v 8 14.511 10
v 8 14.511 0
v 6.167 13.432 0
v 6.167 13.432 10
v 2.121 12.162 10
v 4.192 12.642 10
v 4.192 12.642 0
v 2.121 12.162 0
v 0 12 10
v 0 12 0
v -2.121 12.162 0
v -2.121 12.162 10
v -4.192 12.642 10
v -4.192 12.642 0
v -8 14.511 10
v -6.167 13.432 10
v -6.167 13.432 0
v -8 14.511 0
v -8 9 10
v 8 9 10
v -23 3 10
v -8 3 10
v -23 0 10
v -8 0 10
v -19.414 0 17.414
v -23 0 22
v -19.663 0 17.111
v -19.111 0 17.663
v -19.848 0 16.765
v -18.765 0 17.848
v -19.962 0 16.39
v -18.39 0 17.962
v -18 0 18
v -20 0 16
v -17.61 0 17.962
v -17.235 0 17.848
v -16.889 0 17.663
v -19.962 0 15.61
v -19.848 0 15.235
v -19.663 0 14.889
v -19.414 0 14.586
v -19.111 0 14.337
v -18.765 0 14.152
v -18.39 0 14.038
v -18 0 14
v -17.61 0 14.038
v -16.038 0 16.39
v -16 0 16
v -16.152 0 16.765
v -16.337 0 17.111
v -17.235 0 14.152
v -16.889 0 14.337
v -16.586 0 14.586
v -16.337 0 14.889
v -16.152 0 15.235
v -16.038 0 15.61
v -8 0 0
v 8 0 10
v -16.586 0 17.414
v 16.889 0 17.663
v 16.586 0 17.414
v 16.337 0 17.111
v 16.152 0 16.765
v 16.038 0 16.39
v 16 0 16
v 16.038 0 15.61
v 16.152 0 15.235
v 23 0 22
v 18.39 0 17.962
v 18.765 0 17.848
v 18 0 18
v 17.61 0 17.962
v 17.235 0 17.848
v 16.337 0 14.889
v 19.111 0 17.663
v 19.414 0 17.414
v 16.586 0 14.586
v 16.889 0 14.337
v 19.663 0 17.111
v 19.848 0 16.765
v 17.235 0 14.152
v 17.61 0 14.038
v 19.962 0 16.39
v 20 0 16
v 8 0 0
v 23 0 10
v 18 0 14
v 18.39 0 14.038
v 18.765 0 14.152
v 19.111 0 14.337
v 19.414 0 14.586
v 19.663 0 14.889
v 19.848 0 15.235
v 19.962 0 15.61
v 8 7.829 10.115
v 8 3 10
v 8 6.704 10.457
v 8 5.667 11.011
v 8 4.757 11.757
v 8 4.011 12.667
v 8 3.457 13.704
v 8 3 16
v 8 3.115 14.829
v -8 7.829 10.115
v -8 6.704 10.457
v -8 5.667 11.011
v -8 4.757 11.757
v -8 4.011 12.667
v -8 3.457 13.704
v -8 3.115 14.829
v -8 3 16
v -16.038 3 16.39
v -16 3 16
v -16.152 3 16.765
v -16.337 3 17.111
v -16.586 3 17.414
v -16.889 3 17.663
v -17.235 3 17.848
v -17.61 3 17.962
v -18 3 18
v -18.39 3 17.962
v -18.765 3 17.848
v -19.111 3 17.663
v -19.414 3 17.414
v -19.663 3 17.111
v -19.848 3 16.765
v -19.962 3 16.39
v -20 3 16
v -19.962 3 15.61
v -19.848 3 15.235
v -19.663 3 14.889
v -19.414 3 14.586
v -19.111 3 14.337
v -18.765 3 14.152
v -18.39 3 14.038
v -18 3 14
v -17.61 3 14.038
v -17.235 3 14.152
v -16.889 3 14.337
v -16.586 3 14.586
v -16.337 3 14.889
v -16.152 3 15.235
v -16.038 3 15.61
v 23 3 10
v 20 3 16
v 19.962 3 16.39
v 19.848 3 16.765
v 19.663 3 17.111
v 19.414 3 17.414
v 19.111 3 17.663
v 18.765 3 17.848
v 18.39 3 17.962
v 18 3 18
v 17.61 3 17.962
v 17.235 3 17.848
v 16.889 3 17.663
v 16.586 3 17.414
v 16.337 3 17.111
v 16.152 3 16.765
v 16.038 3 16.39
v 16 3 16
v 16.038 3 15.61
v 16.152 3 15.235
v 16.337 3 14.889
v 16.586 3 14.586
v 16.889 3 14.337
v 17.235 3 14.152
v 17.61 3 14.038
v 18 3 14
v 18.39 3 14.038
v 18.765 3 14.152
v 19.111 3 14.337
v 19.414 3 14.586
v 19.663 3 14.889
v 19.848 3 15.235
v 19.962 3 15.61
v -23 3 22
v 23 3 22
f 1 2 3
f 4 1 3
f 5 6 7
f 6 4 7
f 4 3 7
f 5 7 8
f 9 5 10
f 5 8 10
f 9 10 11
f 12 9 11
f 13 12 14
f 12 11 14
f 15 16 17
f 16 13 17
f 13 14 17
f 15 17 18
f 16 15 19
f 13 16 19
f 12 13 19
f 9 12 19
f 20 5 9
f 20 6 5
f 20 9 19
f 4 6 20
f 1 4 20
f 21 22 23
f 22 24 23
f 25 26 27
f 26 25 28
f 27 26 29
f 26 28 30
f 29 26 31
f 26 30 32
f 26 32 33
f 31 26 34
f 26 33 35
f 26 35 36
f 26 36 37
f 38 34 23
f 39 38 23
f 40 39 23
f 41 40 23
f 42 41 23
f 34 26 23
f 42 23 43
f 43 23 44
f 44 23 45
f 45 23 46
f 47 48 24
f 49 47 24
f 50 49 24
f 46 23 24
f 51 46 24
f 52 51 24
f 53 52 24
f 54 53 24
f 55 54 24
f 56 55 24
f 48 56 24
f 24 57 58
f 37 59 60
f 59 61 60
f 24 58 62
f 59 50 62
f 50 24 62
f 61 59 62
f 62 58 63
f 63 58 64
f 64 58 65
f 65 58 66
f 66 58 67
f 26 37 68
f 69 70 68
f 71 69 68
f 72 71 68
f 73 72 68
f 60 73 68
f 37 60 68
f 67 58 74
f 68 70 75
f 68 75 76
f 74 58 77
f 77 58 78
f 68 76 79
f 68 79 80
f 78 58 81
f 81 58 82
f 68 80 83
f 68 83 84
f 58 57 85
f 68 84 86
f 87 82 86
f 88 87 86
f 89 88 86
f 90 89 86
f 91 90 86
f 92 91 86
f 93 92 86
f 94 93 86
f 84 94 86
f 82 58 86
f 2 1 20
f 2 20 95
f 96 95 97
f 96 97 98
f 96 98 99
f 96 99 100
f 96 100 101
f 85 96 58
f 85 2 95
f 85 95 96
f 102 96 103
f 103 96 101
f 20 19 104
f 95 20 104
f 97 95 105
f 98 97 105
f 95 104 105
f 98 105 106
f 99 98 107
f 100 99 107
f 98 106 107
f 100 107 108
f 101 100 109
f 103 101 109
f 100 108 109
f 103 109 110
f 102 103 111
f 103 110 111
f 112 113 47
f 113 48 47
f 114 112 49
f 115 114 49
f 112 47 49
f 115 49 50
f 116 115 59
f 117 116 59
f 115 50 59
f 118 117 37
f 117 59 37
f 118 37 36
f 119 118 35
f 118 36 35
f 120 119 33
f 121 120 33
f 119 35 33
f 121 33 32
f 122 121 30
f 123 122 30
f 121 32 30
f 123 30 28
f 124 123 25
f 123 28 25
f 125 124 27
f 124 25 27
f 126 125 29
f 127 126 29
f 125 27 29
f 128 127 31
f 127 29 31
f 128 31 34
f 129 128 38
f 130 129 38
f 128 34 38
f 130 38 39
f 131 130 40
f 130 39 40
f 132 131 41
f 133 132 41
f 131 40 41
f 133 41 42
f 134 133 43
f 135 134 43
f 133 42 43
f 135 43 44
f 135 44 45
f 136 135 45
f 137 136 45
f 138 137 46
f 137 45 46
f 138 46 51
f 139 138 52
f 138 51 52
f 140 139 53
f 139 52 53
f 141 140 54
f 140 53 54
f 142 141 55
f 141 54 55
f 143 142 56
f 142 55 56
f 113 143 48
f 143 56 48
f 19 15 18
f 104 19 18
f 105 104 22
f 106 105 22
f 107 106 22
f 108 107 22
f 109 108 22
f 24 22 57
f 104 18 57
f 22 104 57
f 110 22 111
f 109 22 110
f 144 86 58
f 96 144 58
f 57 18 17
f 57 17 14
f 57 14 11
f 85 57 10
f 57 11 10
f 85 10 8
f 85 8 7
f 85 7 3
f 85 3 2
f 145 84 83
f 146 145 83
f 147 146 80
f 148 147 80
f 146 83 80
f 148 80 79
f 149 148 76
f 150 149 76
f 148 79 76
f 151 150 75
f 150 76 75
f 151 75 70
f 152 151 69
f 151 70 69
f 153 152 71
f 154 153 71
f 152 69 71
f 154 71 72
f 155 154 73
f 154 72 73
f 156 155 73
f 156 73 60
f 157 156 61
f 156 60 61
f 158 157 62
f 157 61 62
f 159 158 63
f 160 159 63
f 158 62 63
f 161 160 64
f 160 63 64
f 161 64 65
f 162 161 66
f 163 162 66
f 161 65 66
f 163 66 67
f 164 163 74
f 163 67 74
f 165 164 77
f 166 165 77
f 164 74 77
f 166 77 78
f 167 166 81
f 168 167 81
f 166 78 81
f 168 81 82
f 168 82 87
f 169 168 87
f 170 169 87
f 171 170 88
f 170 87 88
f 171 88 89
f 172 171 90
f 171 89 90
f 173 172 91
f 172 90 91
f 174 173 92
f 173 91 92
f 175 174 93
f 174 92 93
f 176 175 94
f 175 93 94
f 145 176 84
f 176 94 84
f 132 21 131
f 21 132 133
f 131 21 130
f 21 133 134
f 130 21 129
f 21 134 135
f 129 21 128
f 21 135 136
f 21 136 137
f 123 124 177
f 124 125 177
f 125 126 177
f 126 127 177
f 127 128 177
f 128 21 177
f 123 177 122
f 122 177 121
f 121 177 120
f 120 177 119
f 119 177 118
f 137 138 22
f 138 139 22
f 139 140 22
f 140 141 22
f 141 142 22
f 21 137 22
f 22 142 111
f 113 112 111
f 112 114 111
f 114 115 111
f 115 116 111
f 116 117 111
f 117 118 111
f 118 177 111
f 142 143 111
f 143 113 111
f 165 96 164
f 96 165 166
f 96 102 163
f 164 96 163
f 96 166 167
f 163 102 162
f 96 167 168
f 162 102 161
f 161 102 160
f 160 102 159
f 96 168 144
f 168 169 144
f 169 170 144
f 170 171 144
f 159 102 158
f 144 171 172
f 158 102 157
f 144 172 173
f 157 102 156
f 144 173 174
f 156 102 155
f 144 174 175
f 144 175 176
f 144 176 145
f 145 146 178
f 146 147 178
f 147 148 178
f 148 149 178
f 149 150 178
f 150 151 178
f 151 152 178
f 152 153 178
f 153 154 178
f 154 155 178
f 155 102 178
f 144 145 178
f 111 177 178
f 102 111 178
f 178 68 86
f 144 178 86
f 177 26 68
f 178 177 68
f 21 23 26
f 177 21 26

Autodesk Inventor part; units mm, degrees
ref_plane "YZ Plane" through (0, 0, 0) normal (1, 0, 0) x (0, 1, 0)
ref_plane "XZ Plane" through (0, 0, 0) normal (0, 1, 0) x (-1, 0, 0)
ref_plane "XY Plane" through (0, 0, 0) normal (0, 0, 1) x (1, 0, 0)
sketch "Sketch1" plane through (0, 0, 0) normal (0, 0, 1) x (1, 0, 0)
  arc A0 (0, 12) -> (8, 14.5109) centre (0, 26) ccw
  line L0 (0, 0) -> (0, 12) construction
  line L1 (8, 14.5109) -> (8, 0)
  arc A1 (-8, 14.5109) -> (0, 12) centre (0, 26) ccw
  line L2 (-8, 14.5109) -> (-8, 0)
  line L3 (-8, 0) -> (0, 0)
  line L4 (0, 0) -> (8, 0)
  dimension "d0" = 14
  dimension "d9" = 8
  dimension "d13" = 26
extrude "Extrusion1" add sketch "Sketch1" along normal blind 10
sketch "Sketch2" plane through (-8, 0, 0) normal (0, -1, 0) x (1, 0, 0)
  circle A0 centre (-10, 16) radius 2
  circle A1 centre (26, 16) radius 2
  line L0 (-10, 16) -> (26, 16) construction
  line L1 (16, 0) -> (0, 0) construction
  line L2 (0, 10) -> (16, 10) construction
  line L3 (-15, 22) -> (31, 22)
  line L4 (31, 22) -> (31, 10)
  line L5 (31, 10) -> (-15, 10)
  line L6 (-15, 10) -> (-15, 22)
  point P0 (8, 0)
  point P1 (8, 16)
  point P2 (8, 0)
  point P3 (31, 16)
  point P4 (8, 22)
  dimension "d14" = 4
  dimension "d15" = 4
  dimension "d16" = 36
  dimension "d17" = 6
  dimension "d18" = 46
extrude "Extrusion2" add sketch "Sketch2" against normal blind 3
fillet "Fillet1" radius 6 1 edges at (0, 3, 10)
properties part number "DefaultMotorMountBack" material "ABS Plastic"
